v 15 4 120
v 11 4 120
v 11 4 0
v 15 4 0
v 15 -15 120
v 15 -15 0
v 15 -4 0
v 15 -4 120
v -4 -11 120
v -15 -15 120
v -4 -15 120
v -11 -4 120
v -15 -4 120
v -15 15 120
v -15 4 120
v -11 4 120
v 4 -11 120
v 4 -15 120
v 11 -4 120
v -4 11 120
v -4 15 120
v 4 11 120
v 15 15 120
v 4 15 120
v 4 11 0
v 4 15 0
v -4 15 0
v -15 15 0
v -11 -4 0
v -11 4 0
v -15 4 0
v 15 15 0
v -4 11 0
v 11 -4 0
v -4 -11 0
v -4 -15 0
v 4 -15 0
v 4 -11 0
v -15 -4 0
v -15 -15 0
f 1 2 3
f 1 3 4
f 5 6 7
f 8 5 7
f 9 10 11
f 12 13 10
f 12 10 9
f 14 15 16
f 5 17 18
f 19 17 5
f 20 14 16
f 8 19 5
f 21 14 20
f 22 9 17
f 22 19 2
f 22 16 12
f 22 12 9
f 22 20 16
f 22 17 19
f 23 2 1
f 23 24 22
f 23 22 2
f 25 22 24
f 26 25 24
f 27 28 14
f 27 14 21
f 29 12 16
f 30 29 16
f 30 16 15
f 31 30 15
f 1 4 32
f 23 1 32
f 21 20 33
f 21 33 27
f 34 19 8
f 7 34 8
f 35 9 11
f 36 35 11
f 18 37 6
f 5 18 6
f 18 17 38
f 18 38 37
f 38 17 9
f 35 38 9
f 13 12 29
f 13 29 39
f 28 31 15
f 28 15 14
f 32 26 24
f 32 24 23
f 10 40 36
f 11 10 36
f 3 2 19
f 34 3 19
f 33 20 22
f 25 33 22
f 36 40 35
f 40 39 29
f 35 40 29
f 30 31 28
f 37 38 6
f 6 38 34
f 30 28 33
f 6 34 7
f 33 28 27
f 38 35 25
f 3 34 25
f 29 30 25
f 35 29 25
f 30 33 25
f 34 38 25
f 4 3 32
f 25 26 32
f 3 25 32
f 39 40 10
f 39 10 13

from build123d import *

# Parameters (mm, degrees)
SKETCH_W           = 30
SKETCH_H           = 30
PAD_DEPTH          = 120
SKETCH001_W        = 8
SKETCH001_H        = 4
POCKET_DEPTH       = 120
POLARPATTERN_COUNT = 4


with BuildPart() as part:
    # Sketch → Pad (new body)
    with BuildSketch(Plane.XY):
        Rectangle(SKETCH_W, SKETCH_H)
    extrude(amount=PAD_DEPTH)

    # Sketch001 (on Face6 of Pad) → Pocket (cut)
    with BuildSketch(Plane.XY.offset(120)):
        with Locations((0, 13)):
            Rectangle(SKETCH001_W, SKETCH001_H)
    pocket = extrude(amount=-POCKET_DEPTH, mode=Mode.SUBTRACT)

    # PolarPattern: Pocket ×4 about axis
    polarpattern_axis = Axis((0, 0, 120), (0, 0, 1))
    for i in range(1, POLARPATTERN_COUNT):
        add(pocket.rotate(polarpattern_axis, i * 360 / POLARPATTERN_COUNT), mode=Mode.SUBTRACT)


solid = part.part
